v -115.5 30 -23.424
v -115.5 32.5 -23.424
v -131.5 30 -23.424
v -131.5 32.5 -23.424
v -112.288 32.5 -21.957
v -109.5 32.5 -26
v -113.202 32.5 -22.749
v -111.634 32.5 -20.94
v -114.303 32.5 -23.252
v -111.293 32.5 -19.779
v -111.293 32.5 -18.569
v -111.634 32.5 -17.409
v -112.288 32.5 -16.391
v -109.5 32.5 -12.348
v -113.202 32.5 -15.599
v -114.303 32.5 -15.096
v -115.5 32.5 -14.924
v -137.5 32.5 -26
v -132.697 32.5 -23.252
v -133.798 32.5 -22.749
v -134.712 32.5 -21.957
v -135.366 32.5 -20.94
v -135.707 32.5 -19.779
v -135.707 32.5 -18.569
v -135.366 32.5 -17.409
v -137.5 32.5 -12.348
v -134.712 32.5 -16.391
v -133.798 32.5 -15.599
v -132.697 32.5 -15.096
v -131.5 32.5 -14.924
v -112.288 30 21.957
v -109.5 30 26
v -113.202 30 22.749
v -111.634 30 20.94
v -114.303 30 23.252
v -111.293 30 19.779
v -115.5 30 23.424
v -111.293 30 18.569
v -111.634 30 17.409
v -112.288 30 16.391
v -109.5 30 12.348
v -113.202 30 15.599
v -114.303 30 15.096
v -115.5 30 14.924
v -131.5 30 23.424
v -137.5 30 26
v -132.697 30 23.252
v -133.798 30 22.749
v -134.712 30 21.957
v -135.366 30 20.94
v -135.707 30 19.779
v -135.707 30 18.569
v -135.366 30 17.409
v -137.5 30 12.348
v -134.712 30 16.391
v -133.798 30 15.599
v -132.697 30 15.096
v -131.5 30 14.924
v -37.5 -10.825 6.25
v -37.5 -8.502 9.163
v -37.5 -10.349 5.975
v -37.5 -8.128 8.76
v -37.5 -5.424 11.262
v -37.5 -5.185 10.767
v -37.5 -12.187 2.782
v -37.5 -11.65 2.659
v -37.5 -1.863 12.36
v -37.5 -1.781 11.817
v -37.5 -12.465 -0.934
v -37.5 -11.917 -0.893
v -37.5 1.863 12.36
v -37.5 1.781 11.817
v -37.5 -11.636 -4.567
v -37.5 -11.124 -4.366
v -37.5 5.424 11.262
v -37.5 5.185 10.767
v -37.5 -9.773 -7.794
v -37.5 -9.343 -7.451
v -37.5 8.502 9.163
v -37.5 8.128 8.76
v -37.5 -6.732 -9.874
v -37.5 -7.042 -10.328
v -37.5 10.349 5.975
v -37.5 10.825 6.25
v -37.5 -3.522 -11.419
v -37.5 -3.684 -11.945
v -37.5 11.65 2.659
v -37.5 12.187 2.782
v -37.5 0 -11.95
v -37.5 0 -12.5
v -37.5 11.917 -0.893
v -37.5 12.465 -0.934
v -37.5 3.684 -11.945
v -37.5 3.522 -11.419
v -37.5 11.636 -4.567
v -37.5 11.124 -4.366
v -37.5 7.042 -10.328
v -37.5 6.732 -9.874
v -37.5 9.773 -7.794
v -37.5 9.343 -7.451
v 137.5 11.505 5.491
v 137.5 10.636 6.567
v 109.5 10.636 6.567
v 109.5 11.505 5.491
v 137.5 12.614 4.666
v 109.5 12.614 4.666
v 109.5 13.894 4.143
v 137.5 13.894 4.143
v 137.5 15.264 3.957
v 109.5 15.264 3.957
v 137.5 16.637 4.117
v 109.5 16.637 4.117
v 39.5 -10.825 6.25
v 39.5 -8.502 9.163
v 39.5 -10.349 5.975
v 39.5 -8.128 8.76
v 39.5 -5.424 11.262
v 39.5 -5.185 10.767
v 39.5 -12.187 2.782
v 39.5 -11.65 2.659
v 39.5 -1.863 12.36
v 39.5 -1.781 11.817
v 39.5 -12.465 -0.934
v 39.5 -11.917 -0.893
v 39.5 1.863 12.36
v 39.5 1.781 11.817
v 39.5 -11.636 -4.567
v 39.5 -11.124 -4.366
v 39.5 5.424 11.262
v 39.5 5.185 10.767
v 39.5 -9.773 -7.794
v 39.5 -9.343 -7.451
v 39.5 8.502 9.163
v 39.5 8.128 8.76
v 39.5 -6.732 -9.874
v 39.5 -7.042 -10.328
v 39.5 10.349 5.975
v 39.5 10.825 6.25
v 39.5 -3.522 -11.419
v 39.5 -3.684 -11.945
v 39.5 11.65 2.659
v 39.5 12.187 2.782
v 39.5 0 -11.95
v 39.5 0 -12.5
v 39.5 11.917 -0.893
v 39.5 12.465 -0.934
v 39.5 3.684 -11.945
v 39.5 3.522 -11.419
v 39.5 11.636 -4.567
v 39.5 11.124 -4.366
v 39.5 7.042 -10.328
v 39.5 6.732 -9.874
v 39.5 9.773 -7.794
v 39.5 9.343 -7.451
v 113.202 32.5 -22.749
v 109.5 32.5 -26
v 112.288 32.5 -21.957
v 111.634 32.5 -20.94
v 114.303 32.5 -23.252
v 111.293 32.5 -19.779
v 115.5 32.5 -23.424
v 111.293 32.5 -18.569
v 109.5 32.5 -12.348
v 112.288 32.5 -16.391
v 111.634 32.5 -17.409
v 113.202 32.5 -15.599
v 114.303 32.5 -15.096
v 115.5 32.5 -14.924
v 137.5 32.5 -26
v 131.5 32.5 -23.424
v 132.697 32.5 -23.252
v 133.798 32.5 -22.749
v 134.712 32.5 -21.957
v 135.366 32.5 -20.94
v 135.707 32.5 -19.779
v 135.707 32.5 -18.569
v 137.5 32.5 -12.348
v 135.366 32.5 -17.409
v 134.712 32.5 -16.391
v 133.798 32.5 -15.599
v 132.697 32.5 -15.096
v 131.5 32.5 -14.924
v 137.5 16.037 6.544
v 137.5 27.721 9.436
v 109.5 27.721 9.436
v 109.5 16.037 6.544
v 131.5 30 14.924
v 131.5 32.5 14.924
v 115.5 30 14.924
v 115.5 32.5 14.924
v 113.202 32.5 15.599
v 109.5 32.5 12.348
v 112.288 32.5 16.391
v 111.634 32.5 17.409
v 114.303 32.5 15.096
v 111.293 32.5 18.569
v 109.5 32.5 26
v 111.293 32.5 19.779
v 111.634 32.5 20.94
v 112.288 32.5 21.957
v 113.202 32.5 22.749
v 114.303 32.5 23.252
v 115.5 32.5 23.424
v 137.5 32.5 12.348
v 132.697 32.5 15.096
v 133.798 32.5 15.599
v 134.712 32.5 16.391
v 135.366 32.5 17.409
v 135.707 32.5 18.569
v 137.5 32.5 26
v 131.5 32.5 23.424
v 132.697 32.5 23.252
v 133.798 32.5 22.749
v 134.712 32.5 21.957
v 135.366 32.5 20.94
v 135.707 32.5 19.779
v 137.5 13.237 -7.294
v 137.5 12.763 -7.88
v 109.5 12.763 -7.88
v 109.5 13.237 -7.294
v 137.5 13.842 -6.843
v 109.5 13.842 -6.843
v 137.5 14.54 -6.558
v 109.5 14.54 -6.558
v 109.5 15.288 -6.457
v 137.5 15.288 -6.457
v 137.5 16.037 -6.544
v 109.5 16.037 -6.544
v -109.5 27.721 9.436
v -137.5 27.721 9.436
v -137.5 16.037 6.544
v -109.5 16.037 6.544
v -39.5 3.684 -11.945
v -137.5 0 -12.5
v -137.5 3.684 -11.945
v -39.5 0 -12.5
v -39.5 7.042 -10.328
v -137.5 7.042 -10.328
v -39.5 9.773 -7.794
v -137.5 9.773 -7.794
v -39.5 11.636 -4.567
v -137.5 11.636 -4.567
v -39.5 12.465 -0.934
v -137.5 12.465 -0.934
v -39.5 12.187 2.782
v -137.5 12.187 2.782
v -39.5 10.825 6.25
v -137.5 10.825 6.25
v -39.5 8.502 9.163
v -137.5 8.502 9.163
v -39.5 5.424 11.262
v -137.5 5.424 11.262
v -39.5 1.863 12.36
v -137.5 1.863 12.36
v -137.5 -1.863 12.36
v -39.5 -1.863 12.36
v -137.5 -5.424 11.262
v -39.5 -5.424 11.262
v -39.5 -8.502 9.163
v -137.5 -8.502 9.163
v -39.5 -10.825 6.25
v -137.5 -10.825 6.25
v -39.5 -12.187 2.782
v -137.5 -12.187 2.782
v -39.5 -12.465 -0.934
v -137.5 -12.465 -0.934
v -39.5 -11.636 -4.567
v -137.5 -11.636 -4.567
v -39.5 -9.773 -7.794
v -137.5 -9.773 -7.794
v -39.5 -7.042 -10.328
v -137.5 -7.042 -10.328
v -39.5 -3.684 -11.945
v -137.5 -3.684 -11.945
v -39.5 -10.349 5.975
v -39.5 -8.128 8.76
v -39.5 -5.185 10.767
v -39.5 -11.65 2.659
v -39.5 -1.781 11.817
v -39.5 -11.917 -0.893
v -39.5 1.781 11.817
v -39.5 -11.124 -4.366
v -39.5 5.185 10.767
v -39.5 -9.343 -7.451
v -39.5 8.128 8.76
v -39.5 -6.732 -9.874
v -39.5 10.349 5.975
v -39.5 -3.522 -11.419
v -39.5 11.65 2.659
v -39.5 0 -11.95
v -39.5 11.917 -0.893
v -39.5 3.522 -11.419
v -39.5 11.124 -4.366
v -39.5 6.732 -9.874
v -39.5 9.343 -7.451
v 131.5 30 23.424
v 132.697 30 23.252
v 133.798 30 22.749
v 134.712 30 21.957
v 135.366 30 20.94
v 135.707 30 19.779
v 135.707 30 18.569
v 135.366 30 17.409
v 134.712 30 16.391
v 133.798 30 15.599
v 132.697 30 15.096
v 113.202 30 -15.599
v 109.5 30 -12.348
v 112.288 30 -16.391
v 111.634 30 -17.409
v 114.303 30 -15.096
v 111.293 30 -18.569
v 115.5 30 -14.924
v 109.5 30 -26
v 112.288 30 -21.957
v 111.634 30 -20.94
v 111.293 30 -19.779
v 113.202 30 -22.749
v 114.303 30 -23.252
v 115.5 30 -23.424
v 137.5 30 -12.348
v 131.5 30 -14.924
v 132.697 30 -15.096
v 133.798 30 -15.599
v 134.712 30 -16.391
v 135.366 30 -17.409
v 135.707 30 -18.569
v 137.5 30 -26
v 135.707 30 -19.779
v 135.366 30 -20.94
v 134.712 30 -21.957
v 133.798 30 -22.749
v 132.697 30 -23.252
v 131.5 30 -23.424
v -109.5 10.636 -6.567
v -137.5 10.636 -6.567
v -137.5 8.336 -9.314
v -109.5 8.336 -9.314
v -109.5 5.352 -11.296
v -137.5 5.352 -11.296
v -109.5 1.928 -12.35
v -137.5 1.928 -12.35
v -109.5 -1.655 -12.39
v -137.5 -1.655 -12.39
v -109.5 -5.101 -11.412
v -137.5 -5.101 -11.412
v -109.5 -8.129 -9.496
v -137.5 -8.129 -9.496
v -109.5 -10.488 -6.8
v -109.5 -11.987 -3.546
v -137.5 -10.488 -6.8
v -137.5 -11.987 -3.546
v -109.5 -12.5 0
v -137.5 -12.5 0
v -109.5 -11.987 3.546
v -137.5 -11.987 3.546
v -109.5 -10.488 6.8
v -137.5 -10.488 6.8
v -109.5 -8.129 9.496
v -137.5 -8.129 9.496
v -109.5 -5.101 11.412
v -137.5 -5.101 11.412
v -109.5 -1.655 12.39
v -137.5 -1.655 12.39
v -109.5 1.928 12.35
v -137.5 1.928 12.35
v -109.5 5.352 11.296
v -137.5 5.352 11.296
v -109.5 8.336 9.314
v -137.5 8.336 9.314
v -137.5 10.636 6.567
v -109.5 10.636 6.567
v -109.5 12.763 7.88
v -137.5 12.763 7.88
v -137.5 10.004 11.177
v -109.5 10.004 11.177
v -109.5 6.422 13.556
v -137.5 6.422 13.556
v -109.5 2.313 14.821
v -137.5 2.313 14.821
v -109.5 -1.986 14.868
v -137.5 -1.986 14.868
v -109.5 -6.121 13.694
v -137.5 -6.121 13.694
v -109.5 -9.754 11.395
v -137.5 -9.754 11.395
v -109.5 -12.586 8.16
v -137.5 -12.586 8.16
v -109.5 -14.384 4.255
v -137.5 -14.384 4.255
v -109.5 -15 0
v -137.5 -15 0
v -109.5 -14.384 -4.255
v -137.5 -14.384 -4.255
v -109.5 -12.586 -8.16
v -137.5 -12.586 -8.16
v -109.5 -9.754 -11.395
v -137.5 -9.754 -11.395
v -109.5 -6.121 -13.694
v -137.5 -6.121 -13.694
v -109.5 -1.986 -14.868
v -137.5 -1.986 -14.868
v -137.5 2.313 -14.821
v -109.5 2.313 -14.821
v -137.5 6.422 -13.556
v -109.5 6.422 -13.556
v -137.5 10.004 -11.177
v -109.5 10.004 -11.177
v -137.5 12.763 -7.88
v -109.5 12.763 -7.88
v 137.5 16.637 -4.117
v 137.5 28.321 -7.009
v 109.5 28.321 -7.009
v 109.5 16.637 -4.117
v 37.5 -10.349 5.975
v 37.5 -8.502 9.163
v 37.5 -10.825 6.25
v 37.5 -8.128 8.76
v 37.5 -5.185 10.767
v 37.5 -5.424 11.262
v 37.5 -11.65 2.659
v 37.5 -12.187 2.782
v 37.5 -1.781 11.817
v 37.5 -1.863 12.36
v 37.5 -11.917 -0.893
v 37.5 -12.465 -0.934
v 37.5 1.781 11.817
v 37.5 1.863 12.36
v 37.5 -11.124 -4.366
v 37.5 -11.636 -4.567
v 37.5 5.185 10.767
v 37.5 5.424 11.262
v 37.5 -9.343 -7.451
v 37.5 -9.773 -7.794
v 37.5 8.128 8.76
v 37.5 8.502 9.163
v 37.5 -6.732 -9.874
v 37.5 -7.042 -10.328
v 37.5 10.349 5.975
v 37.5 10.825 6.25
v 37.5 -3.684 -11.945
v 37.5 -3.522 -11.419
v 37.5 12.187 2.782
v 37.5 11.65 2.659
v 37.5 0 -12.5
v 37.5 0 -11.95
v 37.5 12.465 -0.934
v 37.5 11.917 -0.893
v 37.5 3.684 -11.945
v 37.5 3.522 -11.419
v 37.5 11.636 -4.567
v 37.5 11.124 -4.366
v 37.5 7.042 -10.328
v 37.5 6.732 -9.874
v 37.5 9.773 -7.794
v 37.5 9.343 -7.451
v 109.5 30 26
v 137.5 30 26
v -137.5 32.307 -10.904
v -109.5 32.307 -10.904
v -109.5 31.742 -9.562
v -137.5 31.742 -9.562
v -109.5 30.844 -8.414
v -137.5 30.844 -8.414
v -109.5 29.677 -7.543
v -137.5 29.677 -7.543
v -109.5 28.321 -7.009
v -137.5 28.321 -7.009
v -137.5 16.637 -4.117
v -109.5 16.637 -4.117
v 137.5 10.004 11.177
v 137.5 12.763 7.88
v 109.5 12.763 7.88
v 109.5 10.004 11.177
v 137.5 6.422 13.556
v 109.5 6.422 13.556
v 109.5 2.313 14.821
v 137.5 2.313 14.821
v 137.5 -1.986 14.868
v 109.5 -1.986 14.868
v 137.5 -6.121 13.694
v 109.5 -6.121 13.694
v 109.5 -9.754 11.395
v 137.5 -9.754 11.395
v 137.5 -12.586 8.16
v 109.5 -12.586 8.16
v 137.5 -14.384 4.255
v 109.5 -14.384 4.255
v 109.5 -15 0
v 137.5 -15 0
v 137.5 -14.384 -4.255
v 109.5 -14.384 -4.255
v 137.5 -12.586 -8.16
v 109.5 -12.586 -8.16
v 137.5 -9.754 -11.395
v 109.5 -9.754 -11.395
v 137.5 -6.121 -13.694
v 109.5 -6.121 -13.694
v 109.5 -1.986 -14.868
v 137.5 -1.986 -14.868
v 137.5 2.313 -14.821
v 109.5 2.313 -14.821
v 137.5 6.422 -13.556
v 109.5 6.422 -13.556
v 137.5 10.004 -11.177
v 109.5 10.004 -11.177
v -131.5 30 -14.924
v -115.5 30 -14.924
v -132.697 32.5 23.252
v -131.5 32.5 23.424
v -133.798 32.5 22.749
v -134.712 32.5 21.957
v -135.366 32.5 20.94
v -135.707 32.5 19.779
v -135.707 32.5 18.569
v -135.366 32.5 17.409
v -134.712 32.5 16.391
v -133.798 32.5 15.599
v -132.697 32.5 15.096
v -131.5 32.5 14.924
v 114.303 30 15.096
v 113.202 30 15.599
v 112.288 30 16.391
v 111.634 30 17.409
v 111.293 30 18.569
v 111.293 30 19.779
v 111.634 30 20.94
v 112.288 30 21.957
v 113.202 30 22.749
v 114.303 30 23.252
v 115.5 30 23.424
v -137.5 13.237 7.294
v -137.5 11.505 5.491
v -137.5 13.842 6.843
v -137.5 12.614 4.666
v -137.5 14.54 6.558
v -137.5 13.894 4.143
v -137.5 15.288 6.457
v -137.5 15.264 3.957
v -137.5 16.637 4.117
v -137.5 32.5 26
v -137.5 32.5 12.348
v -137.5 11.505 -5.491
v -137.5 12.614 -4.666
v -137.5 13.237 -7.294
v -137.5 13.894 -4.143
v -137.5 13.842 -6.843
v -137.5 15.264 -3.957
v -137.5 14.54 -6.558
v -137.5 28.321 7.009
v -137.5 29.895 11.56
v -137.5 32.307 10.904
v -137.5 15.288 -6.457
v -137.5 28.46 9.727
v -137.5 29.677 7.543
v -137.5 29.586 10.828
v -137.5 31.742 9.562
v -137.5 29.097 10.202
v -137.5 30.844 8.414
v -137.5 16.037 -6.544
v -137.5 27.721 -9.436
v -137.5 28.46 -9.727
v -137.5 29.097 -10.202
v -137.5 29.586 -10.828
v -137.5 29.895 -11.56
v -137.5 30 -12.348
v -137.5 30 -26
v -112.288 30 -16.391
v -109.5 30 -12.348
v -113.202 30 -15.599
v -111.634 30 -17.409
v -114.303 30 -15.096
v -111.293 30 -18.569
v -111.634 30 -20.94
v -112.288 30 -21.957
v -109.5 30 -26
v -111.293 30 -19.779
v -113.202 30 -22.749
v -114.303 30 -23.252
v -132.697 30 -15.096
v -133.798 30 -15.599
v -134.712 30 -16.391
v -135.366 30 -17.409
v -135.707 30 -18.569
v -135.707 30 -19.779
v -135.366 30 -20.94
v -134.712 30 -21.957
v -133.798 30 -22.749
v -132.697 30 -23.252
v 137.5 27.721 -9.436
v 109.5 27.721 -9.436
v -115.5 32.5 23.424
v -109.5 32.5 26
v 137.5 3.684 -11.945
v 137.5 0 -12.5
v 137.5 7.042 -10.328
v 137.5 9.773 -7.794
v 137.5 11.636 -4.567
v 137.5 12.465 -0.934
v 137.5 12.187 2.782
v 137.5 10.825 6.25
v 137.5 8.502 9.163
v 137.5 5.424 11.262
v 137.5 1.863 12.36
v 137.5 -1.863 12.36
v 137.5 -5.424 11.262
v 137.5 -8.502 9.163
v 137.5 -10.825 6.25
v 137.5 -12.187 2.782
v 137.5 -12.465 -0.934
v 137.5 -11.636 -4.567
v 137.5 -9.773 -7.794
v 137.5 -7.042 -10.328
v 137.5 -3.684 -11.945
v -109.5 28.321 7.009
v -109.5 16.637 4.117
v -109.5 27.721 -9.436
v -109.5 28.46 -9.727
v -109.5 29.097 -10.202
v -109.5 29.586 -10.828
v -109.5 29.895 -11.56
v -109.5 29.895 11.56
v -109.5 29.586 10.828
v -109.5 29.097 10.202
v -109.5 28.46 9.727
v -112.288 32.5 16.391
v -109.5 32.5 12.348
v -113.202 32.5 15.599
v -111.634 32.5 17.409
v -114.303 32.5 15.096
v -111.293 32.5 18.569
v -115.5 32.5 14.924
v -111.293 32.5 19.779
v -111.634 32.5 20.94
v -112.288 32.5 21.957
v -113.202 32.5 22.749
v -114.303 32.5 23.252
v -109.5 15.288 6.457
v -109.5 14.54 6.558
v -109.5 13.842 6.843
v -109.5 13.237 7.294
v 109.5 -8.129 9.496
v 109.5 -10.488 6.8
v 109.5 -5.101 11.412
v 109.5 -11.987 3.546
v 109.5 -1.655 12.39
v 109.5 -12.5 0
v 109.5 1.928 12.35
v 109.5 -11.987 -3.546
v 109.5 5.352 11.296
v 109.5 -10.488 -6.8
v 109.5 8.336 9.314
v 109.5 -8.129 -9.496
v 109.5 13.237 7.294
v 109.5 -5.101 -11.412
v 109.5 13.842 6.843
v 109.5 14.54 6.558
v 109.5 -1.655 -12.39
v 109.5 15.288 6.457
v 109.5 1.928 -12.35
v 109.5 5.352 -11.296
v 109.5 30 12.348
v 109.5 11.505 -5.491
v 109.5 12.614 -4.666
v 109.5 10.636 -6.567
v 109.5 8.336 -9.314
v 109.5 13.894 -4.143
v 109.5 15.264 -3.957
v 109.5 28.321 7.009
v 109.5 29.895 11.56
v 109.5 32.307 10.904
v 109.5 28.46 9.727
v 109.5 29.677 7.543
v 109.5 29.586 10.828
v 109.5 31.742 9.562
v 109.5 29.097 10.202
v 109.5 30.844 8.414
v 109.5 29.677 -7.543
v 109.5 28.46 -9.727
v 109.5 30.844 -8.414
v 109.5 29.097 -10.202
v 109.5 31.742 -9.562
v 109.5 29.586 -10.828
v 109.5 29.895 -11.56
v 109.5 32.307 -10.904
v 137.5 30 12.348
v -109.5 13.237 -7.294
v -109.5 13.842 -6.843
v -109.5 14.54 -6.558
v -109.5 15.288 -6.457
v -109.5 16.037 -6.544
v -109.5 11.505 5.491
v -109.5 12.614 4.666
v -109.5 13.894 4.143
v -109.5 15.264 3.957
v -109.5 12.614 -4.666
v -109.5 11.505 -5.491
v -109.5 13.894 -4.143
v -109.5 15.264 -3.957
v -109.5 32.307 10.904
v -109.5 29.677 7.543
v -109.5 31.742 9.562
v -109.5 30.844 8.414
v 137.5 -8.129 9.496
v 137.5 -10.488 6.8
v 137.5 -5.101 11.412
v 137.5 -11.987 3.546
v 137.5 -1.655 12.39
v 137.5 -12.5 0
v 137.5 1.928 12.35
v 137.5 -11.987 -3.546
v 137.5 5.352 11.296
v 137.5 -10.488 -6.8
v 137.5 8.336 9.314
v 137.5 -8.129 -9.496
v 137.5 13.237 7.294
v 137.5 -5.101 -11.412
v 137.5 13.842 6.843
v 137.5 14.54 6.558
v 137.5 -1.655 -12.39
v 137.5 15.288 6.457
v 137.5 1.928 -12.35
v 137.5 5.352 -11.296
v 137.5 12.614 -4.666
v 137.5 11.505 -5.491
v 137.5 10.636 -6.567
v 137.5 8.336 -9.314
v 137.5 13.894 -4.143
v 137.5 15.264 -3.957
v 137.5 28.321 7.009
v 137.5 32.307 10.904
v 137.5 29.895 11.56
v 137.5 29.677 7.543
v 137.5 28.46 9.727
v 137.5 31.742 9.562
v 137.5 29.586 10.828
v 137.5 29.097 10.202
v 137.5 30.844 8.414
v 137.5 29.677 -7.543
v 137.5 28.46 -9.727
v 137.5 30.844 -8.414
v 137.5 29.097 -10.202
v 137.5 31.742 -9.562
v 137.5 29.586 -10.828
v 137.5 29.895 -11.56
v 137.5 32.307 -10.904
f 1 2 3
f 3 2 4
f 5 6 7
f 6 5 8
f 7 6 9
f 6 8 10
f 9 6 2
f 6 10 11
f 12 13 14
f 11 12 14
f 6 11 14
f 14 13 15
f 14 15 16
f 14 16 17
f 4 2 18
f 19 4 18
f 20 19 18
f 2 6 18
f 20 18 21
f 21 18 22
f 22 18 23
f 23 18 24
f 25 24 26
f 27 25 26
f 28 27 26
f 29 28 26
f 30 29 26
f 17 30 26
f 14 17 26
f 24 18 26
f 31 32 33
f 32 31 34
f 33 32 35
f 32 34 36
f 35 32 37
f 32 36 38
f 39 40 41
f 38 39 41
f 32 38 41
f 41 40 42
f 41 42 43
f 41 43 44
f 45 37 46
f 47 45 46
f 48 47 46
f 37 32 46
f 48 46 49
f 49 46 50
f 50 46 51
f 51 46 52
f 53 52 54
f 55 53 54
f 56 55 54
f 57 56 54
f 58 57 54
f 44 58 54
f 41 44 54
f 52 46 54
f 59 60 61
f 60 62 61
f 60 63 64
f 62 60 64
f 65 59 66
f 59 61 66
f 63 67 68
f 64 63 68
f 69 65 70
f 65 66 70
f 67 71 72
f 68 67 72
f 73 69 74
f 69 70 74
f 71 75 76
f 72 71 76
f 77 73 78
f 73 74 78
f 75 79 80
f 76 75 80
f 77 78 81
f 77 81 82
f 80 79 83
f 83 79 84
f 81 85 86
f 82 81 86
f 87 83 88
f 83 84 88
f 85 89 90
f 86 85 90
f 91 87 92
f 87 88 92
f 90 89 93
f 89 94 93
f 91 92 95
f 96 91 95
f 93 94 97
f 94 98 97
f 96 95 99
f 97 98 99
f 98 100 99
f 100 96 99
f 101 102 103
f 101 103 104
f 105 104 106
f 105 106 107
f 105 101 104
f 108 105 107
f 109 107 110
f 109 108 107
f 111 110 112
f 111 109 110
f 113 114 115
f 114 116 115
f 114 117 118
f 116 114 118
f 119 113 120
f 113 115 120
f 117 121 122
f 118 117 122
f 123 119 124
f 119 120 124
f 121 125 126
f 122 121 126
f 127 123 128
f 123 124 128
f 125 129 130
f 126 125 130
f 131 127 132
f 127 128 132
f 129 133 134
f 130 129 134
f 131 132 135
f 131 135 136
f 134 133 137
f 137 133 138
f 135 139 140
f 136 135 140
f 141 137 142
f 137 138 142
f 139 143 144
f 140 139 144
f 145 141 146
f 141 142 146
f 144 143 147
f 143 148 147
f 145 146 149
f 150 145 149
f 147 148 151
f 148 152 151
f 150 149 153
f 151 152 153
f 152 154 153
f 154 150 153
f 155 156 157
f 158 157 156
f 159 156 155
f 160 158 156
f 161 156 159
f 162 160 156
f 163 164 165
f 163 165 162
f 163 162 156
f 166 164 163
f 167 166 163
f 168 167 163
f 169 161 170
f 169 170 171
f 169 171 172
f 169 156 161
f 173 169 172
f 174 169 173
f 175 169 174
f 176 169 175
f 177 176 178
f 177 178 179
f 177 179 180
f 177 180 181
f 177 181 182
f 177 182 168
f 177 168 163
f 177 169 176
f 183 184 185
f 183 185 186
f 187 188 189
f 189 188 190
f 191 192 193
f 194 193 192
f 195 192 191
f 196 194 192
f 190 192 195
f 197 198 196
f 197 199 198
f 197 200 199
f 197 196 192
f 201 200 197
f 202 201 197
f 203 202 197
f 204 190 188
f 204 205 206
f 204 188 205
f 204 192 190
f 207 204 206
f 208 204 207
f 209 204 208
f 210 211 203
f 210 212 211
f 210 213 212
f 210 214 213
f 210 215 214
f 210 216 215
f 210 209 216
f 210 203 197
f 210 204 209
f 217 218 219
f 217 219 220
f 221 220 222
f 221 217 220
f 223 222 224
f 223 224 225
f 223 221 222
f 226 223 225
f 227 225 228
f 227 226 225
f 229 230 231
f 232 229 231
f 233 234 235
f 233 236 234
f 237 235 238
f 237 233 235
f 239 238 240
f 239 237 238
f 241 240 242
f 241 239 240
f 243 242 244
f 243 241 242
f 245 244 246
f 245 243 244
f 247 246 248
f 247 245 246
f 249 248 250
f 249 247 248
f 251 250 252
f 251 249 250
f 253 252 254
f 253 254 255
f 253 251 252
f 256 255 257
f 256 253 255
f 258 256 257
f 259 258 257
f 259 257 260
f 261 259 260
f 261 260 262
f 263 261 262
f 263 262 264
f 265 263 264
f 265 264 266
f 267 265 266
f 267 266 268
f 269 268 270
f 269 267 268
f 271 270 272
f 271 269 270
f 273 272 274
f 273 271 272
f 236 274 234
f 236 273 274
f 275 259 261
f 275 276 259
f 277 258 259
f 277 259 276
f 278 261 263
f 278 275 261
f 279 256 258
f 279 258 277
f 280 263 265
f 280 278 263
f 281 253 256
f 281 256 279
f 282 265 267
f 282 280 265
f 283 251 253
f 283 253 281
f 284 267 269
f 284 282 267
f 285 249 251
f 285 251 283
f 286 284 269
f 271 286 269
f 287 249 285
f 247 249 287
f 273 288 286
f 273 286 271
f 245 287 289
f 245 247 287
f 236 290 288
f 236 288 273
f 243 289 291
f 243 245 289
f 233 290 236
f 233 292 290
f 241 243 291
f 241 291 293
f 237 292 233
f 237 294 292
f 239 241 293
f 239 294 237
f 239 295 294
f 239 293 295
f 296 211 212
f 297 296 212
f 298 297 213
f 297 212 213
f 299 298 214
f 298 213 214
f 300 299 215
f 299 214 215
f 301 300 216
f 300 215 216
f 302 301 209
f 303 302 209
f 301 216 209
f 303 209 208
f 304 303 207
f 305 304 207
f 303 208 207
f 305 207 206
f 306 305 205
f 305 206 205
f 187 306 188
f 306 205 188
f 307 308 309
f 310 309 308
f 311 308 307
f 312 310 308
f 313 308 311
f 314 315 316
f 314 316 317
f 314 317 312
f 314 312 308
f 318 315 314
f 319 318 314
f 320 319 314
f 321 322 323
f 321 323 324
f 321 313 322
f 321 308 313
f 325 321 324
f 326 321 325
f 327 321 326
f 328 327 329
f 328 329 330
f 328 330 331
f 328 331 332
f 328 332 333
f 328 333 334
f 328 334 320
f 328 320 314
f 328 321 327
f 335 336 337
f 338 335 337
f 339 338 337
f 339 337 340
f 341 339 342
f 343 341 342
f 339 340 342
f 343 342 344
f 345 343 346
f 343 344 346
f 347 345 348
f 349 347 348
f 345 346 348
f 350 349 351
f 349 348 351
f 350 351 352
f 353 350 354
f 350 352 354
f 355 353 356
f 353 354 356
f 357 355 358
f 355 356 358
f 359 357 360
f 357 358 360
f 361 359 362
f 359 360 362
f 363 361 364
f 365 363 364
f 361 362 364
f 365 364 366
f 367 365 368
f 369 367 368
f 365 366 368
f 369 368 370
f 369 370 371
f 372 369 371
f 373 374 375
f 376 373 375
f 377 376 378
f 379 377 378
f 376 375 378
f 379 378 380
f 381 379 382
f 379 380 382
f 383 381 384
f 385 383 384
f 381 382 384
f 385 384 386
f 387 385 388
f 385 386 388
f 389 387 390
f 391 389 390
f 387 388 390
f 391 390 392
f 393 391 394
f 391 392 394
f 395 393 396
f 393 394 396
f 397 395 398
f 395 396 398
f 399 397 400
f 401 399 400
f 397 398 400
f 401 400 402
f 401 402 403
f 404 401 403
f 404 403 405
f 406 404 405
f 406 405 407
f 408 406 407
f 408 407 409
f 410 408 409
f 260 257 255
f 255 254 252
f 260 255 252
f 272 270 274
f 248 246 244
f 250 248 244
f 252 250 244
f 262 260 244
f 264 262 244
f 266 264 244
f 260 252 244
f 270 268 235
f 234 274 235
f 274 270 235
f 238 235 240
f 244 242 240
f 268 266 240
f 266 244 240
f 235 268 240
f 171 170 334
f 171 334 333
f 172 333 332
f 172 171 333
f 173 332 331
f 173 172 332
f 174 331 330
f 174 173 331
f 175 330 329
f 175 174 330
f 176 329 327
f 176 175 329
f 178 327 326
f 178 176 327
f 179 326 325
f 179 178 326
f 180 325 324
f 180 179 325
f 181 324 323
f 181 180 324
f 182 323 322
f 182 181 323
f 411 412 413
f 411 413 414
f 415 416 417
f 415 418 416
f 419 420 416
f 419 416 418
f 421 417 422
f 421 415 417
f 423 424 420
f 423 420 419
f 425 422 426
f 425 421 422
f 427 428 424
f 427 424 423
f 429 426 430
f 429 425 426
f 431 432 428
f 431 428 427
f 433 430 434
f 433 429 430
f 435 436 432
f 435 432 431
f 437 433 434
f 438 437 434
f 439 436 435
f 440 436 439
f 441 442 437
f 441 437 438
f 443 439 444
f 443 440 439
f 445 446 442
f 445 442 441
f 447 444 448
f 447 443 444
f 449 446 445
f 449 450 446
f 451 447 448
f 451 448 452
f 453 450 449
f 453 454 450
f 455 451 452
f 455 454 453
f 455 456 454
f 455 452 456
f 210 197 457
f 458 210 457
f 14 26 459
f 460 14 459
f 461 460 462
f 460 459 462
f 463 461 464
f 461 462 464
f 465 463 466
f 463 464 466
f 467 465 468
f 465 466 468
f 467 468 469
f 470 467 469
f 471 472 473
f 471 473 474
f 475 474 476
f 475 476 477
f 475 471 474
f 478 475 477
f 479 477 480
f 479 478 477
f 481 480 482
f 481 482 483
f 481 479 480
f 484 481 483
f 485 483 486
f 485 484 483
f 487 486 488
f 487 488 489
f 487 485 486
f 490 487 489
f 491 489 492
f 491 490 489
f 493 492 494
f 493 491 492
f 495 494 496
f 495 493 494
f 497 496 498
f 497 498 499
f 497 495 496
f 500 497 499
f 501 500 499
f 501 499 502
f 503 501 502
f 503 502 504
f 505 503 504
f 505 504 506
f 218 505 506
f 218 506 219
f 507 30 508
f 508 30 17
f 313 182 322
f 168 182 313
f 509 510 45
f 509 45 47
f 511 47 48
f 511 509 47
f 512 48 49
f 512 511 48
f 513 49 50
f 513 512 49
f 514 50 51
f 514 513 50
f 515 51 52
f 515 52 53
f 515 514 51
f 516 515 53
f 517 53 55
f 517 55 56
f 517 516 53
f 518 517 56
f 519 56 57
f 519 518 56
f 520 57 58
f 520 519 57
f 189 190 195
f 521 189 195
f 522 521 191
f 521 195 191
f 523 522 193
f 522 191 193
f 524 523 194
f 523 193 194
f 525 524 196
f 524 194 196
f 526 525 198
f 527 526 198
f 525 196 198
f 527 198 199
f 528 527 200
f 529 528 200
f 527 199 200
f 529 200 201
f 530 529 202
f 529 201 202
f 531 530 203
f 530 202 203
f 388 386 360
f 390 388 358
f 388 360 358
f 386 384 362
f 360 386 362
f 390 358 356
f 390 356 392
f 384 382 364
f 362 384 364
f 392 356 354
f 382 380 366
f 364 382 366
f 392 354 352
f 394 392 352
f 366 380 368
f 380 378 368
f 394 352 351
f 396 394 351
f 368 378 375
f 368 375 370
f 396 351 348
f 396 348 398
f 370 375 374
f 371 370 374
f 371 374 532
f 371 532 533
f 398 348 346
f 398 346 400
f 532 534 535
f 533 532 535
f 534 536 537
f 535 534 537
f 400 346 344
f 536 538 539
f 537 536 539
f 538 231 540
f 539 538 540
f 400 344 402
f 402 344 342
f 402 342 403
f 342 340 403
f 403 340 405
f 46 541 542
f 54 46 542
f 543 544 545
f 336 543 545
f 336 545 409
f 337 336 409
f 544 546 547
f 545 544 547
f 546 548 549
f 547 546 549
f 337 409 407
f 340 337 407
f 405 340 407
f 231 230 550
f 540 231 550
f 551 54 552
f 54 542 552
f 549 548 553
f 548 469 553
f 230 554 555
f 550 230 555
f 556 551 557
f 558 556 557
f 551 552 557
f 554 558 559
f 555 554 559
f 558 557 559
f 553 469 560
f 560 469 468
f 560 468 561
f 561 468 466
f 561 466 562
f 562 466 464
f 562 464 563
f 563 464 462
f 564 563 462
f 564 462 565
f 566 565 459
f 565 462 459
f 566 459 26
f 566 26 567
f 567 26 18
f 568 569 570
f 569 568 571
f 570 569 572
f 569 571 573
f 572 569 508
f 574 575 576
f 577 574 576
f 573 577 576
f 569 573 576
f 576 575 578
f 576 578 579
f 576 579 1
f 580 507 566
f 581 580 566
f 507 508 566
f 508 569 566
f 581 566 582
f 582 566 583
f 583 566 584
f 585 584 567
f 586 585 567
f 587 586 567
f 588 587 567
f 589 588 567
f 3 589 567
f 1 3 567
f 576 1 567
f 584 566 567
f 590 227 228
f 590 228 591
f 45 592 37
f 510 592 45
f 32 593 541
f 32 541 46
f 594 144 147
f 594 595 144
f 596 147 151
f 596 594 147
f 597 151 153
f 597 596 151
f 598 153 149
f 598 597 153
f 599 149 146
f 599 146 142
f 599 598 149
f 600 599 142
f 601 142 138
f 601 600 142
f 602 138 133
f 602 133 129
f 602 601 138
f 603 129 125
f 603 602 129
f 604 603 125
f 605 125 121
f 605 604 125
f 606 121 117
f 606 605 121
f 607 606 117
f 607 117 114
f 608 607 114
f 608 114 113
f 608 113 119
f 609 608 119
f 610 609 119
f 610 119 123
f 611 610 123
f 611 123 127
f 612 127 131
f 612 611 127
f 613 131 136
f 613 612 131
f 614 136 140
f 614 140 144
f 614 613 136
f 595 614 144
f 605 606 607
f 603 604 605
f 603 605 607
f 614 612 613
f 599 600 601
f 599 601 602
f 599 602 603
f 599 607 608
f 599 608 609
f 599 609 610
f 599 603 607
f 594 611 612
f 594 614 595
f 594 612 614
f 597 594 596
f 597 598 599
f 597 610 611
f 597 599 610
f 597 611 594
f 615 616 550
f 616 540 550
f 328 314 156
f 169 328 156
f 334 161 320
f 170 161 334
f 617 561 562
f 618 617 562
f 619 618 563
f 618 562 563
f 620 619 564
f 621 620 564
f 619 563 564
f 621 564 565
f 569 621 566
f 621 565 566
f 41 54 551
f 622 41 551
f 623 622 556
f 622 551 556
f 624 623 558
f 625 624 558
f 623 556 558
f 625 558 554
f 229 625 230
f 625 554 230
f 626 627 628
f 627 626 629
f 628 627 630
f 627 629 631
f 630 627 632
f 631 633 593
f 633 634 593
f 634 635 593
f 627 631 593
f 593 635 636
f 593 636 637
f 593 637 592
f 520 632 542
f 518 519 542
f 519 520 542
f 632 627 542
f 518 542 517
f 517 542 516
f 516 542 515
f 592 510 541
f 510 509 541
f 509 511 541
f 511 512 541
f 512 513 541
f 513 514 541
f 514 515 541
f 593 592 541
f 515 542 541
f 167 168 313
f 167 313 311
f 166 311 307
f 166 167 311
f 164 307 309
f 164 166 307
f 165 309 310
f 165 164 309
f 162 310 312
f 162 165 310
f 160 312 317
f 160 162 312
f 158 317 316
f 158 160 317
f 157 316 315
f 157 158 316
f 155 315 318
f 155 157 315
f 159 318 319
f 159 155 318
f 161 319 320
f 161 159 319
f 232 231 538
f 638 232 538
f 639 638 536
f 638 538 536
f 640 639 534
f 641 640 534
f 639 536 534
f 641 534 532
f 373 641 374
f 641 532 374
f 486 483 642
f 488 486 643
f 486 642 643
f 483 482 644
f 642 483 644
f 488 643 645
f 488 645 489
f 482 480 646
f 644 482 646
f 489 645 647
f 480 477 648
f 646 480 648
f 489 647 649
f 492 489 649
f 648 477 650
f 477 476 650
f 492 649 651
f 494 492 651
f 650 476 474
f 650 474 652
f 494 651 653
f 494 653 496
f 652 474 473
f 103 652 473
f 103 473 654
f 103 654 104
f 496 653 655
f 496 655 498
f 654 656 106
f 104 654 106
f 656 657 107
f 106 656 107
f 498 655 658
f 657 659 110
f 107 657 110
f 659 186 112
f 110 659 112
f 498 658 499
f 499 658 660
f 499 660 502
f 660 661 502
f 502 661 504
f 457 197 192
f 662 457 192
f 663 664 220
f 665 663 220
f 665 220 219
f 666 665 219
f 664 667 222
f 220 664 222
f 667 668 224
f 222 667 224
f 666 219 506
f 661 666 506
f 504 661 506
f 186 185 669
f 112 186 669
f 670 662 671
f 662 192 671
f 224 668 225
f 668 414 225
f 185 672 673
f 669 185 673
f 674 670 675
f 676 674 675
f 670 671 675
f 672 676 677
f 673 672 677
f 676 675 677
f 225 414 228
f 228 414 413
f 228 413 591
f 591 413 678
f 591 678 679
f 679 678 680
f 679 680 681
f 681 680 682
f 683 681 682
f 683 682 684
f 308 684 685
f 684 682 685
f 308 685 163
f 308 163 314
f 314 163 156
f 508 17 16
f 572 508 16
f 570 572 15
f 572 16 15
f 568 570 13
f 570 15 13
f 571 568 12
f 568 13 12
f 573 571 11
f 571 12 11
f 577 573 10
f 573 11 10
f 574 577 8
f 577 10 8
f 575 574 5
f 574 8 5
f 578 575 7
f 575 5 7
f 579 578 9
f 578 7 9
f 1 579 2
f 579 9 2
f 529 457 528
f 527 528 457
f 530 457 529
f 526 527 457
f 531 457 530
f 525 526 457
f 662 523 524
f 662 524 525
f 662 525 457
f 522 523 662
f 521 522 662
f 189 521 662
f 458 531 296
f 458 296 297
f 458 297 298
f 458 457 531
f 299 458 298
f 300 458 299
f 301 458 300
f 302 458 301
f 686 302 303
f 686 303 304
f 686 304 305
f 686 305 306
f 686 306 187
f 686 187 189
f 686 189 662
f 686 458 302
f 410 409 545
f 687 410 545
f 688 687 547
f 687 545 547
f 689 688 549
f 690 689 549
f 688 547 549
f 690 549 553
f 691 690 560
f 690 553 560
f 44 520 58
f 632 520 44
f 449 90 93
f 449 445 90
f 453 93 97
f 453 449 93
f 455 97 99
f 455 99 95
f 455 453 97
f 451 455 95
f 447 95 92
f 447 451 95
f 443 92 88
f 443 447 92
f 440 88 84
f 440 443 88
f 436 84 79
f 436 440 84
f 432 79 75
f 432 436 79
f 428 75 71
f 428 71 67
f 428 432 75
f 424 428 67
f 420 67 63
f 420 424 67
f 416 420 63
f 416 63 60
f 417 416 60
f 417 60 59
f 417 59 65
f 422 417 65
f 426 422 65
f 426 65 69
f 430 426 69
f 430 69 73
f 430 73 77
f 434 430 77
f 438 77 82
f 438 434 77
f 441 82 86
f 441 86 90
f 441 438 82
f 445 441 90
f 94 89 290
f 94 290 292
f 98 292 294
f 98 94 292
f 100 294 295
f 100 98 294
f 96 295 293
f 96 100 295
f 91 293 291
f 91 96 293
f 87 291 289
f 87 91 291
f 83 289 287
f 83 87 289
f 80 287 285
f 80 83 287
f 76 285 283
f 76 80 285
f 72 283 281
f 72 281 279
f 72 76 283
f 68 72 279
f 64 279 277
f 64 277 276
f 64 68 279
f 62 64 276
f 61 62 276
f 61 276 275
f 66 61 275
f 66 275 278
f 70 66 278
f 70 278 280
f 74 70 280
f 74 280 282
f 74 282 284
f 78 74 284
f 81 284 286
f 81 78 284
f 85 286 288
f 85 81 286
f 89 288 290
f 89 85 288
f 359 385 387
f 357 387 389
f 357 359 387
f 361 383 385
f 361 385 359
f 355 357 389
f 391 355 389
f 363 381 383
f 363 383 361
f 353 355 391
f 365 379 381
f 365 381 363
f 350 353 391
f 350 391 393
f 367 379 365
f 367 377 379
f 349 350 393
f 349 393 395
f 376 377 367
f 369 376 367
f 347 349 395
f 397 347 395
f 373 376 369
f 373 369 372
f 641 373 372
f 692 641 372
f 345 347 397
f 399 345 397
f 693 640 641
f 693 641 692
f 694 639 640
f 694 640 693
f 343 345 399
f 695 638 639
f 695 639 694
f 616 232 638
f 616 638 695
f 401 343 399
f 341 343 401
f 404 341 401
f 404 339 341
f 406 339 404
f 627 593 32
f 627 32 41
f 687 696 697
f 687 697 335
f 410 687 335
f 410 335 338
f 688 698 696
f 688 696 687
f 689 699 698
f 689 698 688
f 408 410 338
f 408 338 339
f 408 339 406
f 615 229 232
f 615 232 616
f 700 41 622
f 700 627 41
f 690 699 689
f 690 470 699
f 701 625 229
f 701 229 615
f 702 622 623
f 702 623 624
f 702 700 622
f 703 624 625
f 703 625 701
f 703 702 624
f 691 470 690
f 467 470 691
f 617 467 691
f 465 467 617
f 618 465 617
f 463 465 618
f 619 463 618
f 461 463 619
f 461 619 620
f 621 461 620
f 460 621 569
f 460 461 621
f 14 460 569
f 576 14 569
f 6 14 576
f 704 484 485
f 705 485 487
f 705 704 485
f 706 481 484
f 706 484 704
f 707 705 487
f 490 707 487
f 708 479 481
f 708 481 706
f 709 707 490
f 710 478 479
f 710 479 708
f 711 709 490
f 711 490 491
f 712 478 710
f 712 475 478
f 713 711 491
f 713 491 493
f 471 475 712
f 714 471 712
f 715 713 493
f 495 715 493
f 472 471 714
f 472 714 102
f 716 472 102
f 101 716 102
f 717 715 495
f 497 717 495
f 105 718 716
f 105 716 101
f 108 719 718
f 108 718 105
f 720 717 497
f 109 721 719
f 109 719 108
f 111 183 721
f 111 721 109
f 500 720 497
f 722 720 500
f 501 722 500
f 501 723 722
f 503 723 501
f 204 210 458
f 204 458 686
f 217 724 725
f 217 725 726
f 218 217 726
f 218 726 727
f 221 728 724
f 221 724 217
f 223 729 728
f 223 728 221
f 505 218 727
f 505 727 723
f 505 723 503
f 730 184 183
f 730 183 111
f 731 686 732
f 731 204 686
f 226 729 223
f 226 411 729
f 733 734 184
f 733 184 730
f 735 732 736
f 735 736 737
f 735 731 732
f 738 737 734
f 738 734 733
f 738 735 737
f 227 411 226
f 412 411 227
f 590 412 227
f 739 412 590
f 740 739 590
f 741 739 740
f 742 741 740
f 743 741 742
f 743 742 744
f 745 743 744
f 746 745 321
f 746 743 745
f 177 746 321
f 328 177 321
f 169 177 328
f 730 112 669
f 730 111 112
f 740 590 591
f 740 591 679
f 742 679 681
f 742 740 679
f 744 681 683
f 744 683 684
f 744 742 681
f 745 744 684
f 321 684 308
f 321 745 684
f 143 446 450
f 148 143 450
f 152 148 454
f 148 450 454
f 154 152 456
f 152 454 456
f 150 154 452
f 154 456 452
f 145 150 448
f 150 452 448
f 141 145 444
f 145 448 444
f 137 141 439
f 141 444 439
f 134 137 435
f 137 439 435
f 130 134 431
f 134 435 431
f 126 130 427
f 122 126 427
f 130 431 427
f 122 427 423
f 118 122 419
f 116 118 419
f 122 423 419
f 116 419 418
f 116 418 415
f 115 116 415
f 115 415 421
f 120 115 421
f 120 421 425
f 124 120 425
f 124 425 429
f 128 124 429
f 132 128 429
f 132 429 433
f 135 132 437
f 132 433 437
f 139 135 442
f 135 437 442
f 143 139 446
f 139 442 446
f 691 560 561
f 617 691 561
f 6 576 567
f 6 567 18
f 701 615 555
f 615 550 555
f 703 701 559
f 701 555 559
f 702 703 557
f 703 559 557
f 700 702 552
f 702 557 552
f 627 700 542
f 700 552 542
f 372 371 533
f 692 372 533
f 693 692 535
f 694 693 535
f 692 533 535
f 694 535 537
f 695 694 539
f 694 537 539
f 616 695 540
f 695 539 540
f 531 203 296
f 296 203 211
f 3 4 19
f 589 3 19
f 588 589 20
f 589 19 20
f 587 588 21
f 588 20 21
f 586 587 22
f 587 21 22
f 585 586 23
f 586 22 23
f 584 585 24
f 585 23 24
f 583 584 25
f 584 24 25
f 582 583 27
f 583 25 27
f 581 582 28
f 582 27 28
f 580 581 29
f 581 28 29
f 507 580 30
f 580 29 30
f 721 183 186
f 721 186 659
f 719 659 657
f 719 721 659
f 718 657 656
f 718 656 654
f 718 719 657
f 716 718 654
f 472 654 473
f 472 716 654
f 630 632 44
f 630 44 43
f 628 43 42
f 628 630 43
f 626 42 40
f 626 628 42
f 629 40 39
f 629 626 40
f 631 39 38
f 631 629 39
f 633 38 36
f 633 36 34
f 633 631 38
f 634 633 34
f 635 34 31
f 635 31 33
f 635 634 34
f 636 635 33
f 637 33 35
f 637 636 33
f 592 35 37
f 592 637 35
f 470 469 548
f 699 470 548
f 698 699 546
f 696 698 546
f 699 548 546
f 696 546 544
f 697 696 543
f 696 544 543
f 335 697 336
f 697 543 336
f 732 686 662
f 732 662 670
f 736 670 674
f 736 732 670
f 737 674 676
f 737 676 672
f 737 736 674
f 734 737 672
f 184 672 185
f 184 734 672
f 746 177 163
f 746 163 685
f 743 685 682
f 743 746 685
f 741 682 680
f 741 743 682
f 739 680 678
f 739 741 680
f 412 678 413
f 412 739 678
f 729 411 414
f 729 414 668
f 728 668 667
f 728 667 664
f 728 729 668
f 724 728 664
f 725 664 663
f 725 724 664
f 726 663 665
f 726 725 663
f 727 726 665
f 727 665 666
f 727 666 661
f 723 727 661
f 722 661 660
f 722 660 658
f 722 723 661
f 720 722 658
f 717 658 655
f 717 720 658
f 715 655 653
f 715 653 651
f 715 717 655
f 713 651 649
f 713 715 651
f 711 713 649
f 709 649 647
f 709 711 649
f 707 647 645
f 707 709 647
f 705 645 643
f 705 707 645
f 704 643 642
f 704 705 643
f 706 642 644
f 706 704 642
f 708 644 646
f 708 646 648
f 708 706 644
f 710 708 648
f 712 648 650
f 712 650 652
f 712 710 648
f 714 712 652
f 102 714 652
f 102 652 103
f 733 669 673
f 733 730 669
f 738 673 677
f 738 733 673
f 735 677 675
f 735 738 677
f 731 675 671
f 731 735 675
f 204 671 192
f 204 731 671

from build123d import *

# Parameters (mm, degrees)
SKETCH1_R                = 12.5
BOSS_EXTRUDE1_DEPTH      = 137.5
BOSS_EXTRUDE2_START      = -3
BOSS_EXTRUDE2_DEPTH      = 3
BOSS_EXTRUDE2_DEPTH_BACK = 25
CUT_EXTRUDE3_DEPTH       = 9
SKETCH6_R                = 13
SKETCH6_R_2              = 11.95
CUT_EXTRUDE2_DEPTH       = 2


with BuildPart() as part:
    # Sketch1 → Boss-Extrude1 (new body, symmetric)
    with BuildSketch(Plane(origin=(0, 0, 0), x_dir=(0, 0, -1), z_dir=(1, 0, 0))):
        Circle(SKETCH1_R)
    extrude(amount=BOSS_EXTRUDE1_DEPTH, both=True)

    # Sketch6 → Cut-Extrude2 (cut)
    with BuildSketch(Plane(origin=(37.5, 0, 0), x_dir=(0, 0, -1), z_dir=(1, 0, 0))):
        Circle(SKETCH6_R)
        Circle(SKETCH6_R_2, mode=Mode.SUBTRACT)
    cut_extrude2 = extrude(amount=CUT_EXTRUDE2_DEPTH, mode=Mode.SUBTRACT)

    # Mirror4: Cut-Extrude2 across plane
    add(cut_extrude2.mirror(Plane(origin=(0, 0, 0), x_dir=(0, 0, 1), z_dir=(1, 0, 0))), mode=Mode.SUBTRACT)


with BuildPart() as body_2:
    # Sketch2 → Boss-Extrude2 (new body, two sides)
    with BuildSketch(Plane(origin=(137.5, 0, 0), x_dir=(0, 0, -1), z_dir=(1, 0, 0)).offset(BOSS_EXTRUDE2_START)) as boss_extrude2_sk:
        with BuildLine():
            Line((-12.348050967, 32.5), (-26, 32.5))
            Line((-26, 32.5), (-26, 30))
            Line((-26, 30), (-12.348050967, 30))
            ThreePointArc((-12.348050967, 30), (-10.499016361, 29.362429052), (-9.435908919, 27.720714016))
            Line((-9.435908919, 27.720714016), (-6.544257006, 16.03660501))
            ThreePointArc((-6.544257006, 16.03660501), (-6.678858856, 14.182193305), (-7.880332545, 12.763242495))
            ThreePointArc((-7.880332545, 12.763242495), (0, -15), (7.880332545, 12.763242495))
            ThreePointArc((7.880332545, 12.763242495), (6.678858856, 14.182193305), (6.544257006, 16.03660501))
            Line((6.544257006, 16.03660501), (9.435908919, 27.720714016))
            ThreePointArc((9.435908919, 27.720714016), (10.499016361, 29.362429052), (12.348050967, 30))
            Line((12.348050967, 30), (26, 30))
            Line((26, 30), (26, 32.5))
            Line((26, 32.5), (12.348050967, 32.5))
            ThreePointArc((12.348050967, 32.5), (8.958154189, 31.331119928), (7.009123879, 28.321309029))
            Line((7.009123879, 28.321309029), (4.117471966, 16.637200023))
            ThreePointArc((4.117471966, 16.637200023), (4.364242024, 13.237445232), (6.566943787, 10.636035412))
            ThreePointArc((6.566943787, 10.636035412), (0, -12.5), (-6.566943787, 10.636035412))
            ThreePointArc((-6.566943787, 10.636035412), (-4.364242024, 13.237445232), (-4.117471966, 16.637200023))
            Line((-4.117471966, 16.637200023), (-7.009123879, 28.321309029))
            ThreePointArc((-7.009123879, 28.321309029), (-8.958154189, 31.331119928), (-12.348050967, 32.5))
        make_face()
    extrude(amount=BOSS_EXTRUDE2_DEPTH)
    extrude(boss_extrude2_sk.sketch, amount=-BOSS_EXTRUDE2_DEPTH_BACK)

    # Sketch8 → Cut-Extrude3 (cut)
    with BuildSketch(Plane(origin=(0, 32.5, 0), x_dir=(1, 0, 0), z_dir=(0, 1, 0))):
        with BuildLine():
            Line((115.5, 23.424025484), (131.5, 23.424025484))
            ThreePointArc((131.5, 23.424025484), (135.75, 19.174025484), (131.5, 14.924025484))
            Line((131.5, 14.924025484), (115.5, 14.924025484))
            ThreePointArc((115.5, 14.924025484), (111.25, 19.174025484), (115.5, 23.424025484))
        make_face()
    cut_extrude3 = extrude(amount=-CUT_EXTRUDE3_DEPTH, mode=Mode.SUBTRACT)

    # Mirror5: Cut-Extrude3 across plane
    add(cut_extrude3.mirror(Plane.XY), mode=Mode.SUBTRACT)


with BuildPart() as body_3:
    # Mirror1: mirrored copy
    add(body_2.part.mirror(Plane(origin=(0, 0, 0), x_dir=(0, 0, 1), z_dir=(1, 0, 0))))


solid = Compound([part.part, body_2.part, body_3.part])
